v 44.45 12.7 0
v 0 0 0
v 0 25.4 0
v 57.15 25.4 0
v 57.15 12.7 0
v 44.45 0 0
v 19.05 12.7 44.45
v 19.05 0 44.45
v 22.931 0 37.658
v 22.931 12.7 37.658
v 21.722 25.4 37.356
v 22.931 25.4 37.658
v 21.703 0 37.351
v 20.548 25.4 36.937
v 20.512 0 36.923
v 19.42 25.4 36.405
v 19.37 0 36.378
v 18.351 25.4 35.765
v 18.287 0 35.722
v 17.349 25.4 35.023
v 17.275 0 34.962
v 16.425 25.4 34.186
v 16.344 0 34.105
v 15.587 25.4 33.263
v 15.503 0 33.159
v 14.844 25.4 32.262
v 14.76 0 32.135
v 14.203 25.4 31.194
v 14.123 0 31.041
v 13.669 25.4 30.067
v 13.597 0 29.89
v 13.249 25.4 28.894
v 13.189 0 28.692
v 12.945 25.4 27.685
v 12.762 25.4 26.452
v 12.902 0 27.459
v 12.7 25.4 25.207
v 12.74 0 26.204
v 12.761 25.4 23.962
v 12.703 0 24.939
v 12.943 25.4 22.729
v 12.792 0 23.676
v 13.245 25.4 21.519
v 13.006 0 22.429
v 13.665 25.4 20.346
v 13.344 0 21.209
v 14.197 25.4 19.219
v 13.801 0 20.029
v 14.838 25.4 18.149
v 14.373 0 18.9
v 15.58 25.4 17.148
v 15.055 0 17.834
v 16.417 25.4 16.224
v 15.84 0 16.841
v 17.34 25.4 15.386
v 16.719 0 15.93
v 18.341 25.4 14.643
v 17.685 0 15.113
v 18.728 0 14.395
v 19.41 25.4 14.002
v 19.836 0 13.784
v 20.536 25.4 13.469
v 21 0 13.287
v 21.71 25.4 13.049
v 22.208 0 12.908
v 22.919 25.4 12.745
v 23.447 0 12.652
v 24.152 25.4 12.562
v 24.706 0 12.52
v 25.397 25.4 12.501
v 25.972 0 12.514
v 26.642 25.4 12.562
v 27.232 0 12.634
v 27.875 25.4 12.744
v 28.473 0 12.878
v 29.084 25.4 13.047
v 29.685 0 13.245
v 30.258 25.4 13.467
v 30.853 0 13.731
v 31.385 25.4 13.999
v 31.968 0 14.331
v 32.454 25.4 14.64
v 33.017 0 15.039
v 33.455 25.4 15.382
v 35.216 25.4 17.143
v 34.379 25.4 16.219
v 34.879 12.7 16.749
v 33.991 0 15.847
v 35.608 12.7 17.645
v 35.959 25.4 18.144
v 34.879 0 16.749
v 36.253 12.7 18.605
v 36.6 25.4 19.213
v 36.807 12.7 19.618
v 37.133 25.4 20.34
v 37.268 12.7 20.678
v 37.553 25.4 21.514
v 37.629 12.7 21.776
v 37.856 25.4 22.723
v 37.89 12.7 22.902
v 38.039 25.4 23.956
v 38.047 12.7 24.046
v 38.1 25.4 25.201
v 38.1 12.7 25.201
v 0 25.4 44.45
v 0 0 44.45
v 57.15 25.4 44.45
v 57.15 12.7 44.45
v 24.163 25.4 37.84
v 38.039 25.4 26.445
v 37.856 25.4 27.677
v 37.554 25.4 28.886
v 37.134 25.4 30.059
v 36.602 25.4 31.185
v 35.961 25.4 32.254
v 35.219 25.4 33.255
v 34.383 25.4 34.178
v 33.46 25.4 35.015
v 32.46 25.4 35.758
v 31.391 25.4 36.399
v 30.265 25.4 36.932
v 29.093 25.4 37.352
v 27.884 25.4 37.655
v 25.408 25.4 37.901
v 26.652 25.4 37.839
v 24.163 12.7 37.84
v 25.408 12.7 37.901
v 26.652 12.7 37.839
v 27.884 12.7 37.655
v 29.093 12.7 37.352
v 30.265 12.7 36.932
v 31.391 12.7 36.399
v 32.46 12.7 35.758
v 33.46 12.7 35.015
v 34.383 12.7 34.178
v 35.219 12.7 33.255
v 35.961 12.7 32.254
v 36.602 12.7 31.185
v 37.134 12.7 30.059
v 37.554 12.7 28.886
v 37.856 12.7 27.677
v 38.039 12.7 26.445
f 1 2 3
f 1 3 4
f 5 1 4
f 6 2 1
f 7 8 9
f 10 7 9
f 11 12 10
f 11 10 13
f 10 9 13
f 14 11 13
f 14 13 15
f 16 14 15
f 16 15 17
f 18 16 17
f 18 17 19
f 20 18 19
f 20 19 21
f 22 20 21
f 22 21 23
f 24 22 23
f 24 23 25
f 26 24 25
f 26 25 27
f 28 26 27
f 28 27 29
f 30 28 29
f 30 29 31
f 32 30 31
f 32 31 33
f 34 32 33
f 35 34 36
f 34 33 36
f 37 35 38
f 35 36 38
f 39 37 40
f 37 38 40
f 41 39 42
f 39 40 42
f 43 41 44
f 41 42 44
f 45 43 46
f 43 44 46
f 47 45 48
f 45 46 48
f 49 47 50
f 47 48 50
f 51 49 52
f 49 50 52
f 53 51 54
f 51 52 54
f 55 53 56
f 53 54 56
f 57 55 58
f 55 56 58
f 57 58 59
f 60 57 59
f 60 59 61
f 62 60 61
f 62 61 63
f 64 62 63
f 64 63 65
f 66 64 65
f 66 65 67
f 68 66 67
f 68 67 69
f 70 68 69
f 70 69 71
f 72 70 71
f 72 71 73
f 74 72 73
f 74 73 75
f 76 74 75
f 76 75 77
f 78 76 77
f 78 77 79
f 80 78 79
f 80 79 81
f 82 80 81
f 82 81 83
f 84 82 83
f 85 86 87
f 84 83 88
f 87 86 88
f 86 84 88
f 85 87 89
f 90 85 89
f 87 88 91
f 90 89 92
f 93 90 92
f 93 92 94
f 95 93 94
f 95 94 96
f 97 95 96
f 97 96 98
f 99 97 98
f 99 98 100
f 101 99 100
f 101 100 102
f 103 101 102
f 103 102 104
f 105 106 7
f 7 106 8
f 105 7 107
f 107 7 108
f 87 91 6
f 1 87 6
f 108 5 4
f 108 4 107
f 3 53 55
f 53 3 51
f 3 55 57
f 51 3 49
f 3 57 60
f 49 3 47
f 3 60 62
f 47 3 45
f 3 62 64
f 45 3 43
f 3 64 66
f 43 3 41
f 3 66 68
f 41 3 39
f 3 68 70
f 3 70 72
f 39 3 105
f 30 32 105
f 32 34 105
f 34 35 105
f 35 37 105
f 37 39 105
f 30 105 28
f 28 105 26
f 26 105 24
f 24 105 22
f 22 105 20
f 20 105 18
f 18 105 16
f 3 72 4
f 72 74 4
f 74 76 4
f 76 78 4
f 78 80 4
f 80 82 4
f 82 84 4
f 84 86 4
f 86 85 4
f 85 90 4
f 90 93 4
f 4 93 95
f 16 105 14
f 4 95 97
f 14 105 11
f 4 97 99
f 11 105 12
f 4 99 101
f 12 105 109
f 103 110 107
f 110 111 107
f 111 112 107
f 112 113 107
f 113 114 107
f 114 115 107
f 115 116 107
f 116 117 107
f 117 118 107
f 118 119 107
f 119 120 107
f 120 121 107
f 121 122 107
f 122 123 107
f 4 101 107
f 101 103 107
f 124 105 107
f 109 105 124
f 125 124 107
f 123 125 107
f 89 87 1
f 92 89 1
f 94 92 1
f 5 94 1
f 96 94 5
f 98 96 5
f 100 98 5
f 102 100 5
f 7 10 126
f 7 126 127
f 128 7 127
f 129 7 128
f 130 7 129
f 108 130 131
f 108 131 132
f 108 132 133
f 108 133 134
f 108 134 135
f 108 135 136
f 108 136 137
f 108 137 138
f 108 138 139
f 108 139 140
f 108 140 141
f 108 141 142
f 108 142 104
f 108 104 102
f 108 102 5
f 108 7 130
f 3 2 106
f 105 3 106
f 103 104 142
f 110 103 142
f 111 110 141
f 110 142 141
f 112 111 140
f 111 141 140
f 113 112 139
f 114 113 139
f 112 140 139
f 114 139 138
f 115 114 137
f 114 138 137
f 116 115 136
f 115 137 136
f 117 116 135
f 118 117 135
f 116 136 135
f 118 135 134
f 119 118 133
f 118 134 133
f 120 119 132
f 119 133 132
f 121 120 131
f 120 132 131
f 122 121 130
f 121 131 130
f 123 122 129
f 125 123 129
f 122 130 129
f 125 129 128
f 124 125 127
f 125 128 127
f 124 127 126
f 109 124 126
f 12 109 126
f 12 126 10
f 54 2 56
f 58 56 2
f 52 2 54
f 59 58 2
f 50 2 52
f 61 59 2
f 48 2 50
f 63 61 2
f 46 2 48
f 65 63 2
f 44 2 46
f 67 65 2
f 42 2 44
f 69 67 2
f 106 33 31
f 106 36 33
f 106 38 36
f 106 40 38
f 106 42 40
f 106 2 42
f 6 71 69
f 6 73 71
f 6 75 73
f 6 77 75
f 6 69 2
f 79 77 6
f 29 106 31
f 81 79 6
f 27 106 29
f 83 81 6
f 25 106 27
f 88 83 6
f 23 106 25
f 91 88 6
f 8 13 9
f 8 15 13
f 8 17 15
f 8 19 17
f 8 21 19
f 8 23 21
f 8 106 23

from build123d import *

# Parameters (mm, degrees)
F0_W     = 57.15
F0_H     = 44.45
F1_DEPTH = 25.4
F3_DEPTH = 50.8
F5_DEPTH = 12.7


with BuildPart() as f1:
    # F0 (on Front) → F1 (new body)
    with BuildSketch(Plane.XZ):
        with Locations((28.575, 22.225)):
            Rectangle(F0_W, F0_H)
    extrude(amount=-F1_DEPTH)

    # F2 (on face) → F3 (cut)
    with BuildSketch(Plane.XZ):
        with BuildLine():
            ThreePointArc((34.8792097013, 16.7488830228), (37.2675179209, 20.6783904546), (38.1, 25.2007812379))
            ThreePointArc((38.1, 25.2007812379), (33.4601568868, 35.0152537637), (22.930886463, 37.6584486898))
            Line((22.930886463, 37.6584486898), (34.8792097013, 16.7488830228))
        make_face()
        with BuildLine():
            Line((34.8792097013, 16.7488830228), (22.930886463, 37.6584486898))
            ThreePointArc((22.930886463, 37.6584486898), (14.373312095, 18.8998167208), (34.8792097013, 16.7488830228))
        make_face()
    extrude(amount=-F3_DEPTH, mode=Mode.SUBTRACT)

    # F4 (on face) → F5 (cut)
    with BuildSketch(Plane.XZ):
        with BuildLine():
            Line((57.15, 44.45), (19.05, 44.45))
            Line((19.05, 44.45), (22.930886463, 37.6584486898))
            ThreePointArc((22.930886463, 37.6584486898), (33.4601568868, 35.0152537637), (38.1, 25.2007812379))
            ThreePointArc((38.1, 25.2007812379), (37.2675179209, 20.6783904546), (34.8792097013, 16.7488830228))
            Line((34.8792097013, 16.7488830228), (44.45, 0))
            Line((44.45, 0), (57.15, 0))
            Line((57.15, 0), (57.15, 44.45))
        make_face()
    extrude(amount=-F5_DEPTH, mode=Mode.SUBTRACT)


solid = f1.part
